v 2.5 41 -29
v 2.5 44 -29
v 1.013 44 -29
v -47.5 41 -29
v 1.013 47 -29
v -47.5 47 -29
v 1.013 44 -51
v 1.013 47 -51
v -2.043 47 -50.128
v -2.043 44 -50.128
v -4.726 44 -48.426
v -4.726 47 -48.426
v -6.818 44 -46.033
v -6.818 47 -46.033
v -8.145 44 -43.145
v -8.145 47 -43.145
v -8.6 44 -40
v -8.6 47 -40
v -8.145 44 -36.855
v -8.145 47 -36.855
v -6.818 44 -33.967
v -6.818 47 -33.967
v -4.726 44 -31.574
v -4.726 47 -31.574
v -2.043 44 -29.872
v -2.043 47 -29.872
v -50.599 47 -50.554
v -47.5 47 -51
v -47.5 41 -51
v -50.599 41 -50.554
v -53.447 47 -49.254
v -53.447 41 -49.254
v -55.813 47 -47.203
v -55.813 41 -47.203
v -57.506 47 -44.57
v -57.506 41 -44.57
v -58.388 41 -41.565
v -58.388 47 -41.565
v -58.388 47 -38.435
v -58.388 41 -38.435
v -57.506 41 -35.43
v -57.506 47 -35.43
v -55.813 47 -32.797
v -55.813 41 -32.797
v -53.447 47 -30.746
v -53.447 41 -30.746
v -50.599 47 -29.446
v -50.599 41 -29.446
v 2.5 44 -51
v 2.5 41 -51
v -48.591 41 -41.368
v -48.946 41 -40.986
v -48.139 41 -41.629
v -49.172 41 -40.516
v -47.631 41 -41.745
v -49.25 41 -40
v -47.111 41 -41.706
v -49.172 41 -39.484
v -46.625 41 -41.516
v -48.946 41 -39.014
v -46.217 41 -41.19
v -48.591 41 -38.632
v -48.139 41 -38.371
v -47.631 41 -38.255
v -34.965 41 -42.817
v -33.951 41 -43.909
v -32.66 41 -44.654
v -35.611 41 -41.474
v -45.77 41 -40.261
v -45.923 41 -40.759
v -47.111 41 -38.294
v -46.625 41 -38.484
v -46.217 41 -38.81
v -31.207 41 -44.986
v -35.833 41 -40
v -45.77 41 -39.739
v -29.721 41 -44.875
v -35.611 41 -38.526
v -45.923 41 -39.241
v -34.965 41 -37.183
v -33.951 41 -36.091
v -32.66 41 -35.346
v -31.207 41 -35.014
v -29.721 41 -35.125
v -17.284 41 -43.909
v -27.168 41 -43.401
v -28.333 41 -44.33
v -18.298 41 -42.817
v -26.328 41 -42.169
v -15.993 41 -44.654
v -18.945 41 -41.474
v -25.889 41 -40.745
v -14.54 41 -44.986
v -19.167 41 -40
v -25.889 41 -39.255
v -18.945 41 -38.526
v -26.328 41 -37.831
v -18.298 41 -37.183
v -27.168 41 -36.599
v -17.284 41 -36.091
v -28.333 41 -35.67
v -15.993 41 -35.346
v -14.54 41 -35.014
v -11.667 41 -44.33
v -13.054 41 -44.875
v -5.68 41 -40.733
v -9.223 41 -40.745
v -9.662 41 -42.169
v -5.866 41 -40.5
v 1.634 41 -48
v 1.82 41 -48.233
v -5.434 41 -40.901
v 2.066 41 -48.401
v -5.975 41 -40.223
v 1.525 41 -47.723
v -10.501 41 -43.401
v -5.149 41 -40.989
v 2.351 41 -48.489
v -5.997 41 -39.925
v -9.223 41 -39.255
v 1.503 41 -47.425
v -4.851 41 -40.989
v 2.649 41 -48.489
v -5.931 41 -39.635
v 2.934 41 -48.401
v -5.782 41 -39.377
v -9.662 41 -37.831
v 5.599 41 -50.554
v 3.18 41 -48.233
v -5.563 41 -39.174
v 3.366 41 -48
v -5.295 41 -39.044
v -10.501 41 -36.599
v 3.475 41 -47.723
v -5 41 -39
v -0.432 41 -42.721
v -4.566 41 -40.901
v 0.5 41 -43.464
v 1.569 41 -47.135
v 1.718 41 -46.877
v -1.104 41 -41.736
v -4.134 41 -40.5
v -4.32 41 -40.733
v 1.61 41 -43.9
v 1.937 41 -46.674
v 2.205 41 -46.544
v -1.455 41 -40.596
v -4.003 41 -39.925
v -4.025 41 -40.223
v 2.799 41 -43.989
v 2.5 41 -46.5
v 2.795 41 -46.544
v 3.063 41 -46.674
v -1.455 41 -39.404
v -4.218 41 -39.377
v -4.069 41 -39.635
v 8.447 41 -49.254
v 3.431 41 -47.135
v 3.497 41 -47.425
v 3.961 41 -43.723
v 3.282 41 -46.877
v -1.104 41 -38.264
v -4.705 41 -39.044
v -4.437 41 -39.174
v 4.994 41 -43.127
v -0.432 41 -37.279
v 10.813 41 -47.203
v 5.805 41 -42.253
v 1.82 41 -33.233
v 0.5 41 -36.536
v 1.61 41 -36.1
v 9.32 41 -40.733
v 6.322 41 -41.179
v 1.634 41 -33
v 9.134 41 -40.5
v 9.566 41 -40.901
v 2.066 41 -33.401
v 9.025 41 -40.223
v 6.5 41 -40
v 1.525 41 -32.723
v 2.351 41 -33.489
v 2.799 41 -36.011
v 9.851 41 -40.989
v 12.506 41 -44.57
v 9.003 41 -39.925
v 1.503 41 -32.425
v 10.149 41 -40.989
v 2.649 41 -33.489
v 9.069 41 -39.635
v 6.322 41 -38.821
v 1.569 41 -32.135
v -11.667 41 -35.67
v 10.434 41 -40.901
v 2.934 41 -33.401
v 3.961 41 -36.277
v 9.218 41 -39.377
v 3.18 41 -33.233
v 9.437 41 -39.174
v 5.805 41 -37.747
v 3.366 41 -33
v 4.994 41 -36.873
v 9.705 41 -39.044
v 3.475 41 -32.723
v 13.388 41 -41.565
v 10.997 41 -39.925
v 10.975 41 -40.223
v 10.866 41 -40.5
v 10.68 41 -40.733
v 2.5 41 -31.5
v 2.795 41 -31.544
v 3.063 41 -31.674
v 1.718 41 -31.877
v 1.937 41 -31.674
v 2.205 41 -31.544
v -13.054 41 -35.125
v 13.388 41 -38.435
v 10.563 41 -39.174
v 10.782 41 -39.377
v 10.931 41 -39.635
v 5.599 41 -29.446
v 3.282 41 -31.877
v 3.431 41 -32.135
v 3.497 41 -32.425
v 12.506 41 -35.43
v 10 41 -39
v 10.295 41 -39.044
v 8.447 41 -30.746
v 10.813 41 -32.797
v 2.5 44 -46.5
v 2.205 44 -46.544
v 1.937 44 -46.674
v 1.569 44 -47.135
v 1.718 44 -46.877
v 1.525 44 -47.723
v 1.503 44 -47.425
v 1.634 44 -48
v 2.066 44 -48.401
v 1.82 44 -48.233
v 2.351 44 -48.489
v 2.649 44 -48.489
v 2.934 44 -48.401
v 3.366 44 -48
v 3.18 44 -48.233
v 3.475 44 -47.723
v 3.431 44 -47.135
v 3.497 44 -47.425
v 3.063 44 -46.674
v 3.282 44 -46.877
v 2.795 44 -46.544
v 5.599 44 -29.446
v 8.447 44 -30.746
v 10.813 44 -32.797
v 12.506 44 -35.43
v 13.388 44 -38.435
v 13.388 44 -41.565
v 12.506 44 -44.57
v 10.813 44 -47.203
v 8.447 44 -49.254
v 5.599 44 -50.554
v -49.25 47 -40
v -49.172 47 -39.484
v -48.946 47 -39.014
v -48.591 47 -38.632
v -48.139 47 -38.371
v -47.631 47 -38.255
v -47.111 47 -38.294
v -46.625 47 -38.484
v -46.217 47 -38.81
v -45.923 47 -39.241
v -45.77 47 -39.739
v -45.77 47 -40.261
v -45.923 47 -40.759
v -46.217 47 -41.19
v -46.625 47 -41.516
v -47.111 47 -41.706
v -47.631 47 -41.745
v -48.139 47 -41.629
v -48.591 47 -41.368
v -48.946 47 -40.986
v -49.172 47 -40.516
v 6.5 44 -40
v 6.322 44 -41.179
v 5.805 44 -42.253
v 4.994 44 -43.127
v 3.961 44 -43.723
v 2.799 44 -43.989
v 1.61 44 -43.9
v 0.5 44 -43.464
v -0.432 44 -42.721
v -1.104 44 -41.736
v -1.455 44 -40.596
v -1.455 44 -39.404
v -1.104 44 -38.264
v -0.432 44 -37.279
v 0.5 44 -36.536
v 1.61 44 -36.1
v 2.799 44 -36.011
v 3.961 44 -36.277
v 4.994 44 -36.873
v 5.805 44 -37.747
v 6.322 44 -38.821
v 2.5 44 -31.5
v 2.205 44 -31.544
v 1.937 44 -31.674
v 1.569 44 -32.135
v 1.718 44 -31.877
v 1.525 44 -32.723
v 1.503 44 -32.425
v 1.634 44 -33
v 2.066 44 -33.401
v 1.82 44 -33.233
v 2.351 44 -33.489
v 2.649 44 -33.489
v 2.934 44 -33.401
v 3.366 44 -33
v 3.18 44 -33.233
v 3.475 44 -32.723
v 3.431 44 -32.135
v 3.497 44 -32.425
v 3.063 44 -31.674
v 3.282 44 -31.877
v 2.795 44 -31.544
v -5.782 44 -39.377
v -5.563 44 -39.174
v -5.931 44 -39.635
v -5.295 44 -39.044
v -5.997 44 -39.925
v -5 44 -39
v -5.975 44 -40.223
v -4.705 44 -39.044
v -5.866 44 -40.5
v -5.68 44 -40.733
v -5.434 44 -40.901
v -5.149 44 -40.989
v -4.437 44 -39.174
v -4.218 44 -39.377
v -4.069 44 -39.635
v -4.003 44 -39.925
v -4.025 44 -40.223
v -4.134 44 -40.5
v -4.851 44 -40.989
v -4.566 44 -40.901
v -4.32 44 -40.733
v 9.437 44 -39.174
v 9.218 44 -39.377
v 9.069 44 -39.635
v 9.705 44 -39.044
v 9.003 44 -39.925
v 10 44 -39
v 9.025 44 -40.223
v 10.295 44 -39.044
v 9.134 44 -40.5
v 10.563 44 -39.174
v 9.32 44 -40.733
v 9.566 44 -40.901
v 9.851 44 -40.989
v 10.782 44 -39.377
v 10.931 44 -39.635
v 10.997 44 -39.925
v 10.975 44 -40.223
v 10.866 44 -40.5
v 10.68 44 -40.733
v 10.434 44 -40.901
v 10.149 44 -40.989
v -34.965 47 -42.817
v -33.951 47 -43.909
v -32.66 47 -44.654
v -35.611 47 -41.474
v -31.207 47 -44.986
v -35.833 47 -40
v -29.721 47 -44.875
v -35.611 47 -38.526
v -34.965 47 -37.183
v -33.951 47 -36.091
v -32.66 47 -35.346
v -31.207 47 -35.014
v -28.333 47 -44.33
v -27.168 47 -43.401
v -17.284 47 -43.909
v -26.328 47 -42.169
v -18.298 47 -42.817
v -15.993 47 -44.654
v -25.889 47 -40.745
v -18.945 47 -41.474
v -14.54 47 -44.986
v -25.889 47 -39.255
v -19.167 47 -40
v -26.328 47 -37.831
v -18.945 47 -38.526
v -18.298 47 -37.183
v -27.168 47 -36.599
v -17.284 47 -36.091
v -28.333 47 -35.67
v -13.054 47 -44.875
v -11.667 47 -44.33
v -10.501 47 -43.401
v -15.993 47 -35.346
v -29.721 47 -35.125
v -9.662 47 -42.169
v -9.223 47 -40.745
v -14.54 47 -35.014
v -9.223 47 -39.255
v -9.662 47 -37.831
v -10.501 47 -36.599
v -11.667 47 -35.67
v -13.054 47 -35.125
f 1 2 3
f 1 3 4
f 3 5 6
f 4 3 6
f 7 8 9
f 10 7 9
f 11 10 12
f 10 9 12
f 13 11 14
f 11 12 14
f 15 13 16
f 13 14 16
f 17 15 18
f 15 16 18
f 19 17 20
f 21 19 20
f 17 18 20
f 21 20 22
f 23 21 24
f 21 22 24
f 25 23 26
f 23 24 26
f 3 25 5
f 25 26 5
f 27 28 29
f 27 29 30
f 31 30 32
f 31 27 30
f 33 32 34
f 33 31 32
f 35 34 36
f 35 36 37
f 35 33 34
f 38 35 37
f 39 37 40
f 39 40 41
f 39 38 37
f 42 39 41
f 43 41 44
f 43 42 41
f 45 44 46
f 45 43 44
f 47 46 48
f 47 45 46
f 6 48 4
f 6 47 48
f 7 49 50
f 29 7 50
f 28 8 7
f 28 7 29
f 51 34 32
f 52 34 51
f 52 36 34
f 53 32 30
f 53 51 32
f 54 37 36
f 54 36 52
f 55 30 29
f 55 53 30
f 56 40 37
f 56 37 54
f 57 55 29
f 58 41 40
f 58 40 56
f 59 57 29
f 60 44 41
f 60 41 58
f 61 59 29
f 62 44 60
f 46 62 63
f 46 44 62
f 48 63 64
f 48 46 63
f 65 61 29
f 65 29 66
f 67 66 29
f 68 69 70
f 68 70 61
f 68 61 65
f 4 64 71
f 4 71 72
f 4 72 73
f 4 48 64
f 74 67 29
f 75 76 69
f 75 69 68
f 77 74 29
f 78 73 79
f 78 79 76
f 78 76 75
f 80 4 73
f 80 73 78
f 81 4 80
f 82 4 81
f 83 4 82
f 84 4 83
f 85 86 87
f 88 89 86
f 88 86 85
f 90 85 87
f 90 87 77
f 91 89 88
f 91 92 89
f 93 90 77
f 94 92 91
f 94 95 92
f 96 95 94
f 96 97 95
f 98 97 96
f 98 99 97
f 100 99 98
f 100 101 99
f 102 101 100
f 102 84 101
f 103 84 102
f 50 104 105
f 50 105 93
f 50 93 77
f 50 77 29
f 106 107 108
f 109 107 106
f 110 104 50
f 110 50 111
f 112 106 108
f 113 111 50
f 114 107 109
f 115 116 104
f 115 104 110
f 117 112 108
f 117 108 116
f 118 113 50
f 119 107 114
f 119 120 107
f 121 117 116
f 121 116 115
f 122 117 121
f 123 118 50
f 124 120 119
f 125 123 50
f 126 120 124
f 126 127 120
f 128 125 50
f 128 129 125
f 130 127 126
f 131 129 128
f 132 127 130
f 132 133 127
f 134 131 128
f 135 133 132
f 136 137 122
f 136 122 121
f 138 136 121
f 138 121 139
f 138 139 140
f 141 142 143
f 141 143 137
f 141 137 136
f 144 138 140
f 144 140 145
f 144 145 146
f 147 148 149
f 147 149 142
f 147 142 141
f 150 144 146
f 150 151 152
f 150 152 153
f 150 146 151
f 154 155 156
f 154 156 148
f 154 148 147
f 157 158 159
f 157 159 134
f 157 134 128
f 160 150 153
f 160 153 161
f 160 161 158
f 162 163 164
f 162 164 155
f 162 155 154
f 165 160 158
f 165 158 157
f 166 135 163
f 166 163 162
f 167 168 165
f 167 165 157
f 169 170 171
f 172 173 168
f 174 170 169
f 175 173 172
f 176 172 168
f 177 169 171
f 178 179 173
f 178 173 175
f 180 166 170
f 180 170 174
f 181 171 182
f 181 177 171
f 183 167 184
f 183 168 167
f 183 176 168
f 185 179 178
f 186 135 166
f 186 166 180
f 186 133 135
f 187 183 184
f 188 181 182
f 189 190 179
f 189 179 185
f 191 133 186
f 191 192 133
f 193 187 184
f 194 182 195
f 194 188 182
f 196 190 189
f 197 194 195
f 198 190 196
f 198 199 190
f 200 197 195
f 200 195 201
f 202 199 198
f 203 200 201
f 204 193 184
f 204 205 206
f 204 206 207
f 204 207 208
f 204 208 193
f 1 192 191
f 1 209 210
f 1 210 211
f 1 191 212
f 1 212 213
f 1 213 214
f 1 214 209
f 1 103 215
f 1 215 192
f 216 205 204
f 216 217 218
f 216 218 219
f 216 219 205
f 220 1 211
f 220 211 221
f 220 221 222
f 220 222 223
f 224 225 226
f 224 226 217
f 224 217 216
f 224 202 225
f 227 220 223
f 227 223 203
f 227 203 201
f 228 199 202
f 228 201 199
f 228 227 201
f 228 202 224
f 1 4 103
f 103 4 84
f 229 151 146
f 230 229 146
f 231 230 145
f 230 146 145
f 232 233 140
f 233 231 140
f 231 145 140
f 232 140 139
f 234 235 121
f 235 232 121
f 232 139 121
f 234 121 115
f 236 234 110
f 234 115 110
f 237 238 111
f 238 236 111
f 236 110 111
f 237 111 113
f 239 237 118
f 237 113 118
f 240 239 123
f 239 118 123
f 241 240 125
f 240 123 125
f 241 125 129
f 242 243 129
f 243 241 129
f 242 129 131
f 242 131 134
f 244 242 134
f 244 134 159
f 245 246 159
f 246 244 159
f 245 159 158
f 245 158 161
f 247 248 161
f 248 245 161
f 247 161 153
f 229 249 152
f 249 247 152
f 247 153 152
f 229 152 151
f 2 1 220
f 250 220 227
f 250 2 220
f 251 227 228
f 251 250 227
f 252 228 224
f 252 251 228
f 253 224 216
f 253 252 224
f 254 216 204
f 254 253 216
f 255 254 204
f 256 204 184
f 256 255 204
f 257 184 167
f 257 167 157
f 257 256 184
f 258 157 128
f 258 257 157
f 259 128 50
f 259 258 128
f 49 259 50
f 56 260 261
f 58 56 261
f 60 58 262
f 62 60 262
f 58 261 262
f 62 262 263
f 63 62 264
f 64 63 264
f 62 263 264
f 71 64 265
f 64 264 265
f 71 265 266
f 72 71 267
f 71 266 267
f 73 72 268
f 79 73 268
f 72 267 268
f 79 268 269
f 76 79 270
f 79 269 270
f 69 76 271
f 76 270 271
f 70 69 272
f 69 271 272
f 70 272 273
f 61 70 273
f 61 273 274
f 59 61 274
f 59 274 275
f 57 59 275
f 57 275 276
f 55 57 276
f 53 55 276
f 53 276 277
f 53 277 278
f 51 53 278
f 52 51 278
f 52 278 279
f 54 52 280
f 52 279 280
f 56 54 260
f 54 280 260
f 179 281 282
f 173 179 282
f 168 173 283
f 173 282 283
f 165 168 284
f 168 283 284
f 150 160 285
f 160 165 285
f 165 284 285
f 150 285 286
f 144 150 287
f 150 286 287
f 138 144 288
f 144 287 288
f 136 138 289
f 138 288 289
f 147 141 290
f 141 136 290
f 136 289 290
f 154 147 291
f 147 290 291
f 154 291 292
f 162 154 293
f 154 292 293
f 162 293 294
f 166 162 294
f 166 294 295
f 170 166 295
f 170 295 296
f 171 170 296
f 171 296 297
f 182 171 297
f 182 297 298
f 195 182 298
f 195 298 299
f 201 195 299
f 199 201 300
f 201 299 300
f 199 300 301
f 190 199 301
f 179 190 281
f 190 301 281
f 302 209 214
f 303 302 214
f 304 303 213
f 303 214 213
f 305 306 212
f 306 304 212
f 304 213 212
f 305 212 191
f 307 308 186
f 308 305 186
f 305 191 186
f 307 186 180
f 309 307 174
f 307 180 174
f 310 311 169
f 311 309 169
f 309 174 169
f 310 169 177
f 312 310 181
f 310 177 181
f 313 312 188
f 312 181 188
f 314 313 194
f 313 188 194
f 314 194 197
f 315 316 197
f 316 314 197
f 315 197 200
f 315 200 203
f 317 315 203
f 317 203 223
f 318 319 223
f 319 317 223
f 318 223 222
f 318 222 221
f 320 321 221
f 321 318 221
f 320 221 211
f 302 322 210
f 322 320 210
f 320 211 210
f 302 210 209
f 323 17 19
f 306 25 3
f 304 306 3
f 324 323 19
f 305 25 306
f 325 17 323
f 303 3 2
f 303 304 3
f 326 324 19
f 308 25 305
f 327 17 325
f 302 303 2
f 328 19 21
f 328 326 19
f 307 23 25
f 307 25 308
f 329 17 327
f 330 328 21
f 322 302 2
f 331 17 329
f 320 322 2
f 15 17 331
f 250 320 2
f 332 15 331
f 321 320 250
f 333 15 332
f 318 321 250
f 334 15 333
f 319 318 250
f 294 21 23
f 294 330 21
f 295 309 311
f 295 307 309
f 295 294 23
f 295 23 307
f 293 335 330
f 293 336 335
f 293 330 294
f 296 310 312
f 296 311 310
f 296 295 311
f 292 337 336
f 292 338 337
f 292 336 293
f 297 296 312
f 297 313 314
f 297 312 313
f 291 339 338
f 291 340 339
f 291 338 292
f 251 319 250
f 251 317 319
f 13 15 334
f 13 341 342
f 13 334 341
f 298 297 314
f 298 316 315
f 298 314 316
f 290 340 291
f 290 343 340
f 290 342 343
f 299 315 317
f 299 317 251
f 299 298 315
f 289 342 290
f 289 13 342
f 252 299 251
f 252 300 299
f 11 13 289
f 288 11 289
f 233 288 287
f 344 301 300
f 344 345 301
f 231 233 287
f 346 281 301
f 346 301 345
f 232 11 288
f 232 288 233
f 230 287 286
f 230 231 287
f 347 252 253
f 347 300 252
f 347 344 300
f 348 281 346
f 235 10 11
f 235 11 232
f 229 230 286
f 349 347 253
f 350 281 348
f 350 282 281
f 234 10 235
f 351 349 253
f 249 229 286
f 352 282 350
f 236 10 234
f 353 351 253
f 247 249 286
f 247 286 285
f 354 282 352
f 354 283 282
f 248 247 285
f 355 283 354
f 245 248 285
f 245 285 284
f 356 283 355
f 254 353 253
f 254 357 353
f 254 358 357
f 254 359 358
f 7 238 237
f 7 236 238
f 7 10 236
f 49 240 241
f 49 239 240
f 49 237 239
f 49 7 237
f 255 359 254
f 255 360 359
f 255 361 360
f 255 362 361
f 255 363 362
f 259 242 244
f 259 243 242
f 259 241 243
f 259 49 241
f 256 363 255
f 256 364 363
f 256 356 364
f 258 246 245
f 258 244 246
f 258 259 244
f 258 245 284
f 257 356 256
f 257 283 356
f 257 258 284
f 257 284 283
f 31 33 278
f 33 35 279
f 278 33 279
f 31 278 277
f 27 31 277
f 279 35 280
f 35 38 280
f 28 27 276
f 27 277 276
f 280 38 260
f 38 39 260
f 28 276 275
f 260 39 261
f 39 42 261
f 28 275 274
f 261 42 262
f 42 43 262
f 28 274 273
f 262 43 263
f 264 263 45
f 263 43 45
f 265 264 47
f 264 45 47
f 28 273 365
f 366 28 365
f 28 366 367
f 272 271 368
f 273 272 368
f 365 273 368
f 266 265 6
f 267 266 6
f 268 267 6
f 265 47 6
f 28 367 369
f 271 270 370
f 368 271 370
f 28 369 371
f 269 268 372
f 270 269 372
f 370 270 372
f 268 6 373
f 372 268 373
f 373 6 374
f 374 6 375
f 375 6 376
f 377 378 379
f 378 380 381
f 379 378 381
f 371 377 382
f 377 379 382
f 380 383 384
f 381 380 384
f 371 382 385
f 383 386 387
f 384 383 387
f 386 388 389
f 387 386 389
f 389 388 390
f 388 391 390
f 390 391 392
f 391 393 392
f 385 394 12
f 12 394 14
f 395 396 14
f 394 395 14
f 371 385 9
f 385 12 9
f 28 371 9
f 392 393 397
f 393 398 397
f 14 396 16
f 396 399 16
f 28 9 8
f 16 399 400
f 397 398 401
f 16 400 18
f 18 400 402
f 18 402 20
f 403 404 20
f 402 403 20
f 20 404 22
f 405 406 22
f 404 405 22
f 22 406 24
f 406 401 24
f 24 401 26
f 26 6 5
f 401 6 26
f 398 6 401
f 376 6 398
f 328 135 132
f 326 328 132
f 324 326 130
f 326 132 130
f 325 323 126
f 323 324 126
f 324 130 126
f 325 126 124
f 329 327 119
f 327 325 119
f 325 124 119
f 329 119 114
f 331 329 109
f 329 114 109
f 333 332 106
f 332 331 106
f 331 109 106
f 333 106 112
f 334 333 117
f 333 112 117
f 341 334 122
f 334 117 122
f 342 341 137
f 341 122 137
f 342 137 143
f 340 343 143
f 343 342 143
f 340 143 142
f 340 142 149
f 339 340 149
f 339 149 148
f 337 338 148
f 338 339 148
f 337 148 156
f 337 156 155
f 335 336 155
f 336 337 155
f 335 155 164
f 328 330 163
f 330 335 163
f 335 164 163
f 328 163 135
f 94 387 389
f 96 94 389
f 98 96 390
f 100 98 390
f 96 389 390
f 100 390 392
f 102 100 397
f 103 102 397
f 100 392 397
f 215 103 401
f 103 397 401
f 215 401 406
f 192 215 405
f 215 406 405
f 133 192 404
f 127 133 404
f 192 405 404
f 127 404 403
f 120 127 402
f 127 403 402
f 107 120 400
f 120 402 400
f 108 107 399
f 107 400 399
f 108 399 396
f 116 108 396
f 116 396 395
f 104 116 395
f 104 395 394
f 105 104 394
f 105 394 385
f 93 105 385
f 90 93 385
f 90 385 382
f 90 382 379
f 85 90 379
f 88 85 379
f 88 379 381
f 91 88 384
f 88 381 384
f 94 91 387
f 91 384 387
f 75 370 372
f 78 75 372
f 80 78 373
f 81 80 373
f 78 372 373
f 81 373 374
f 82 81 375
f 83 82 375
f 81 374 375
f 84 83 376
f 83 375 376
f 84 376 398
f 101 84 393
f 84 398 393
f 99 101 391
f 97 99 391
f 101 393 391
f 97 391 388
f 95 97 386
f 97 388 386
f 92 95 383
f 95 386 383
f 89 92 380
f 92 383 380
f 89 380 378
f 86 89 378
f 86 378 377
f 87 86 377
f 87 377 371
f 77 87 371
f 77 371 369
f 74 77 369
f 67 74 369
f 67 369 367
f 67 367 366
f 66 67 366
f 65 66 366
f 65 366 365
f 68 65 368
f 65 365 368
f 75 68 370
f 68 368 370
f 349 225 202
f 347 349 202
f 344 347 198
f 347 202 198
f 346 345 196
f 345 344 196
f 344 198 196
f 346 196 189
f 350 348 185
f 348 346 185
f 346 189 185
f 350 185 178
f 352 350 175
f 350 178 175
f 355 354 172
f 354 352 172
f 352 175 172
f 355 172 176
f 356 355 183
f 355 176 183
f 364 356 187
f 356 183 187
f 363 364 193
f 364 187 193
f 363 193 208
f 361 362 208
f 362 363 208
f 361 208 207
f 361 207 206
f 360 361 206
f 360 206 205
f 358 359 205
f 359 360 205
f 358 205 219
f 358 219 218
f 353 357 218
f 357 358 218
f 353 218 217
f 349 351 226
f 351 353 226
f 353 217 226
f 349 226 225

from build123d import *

# Parameters (mm, degrees)
CYLINDER020_R             = 11.1
CYLINDER020_DEPTH         = 26
CYLINDER019_R             = 4
CYLINDER019_DEPTH         = 43
CYLINDER021_R             = 1
CYLINDER021_DEPTH         = 31
CYLINDER024_R             = 1
CYLINDER024_DEPTH         = 31
CYLINDER023_R             = 1
CYLINDER023_DEPTH         = 31
CYLINDER022_R             = 1
CYLINDER022_DEPTH         = 31
FUSION002_ROLL_ANGLE      = -90
FUSION003_PLACEMENT_ANGLE = 180
SKETCH_R                  = 5
SKETCH_R_2                = 1.75
PAD_DEPTH                 = 6
CUT_PITCH_ANGLE           = 90


with BuildPart() as cylinder141:
    # Cylinder020 → Cylinder020 (new body)
    with BuildSketch(Plane(origin=(-3, 71, 73), x_dir=(0, 0, 1), z_dir=(0, -1, 0))):
        Circle(CYLINDER020_R)
    extrude(amount=CYLINDER020_DEPTH)


with BuildPart() as fusion001:
    # Cylinder019 → Cylinder019 (new body)
    with BuildSketch(Plane(origin=(-3, 66, 73), x_dir=(0, 0, 1), z_dir=(0, -1, 0))):
        Circle(CYLINDER019_R)
    extrude(amount=CYLINDER019_DEPTH)

    # Fusion001: union Cylinder141
    add(cylinder141.part)


with BuildPart() as cylinder096:
    # Cylinder021 → Cylinder021 (new body)
    with BuildSketch(Plane(origin=(-7.5, -11, 132), x_dir=(1, 0, 0), z_dir=(0, 0, 1))):
        Circle(CYLINDER021_R)
    extrude(amount=CYLINDER021_DEPTH)


with BuildPart() as cylinder146:
    # Cylinder024 → Cylinder024 (new body)
    with BuildSketch(Plane(origin=(0, -3.5, 132), x_dir=(1, 0, 0), z_dir=(0, 0, 1))):
        Circle(CYLINDER024_R)
    extrude(amount=CYLINDER024_DEPTH)


with BuildPart() as cylinder145:
    # Cylinder023 → Cylinder023 (new body)
    with BuildSketch(Plane(origin=(7.5, -11, 132), x_dir=(1, 0, 0), z_dir=(0, 0, 1))):
        Circle(CYLINDER023_R)
    extrude(amount=CYLINDER023_DEPTH)


with BuildPart() as fusion003:
    # Cylinder022 → Cylinder022 (new body)
    with BuildSketch(Plane(origin=(0, -18.5, 132), x_dir=(1, 0, 0), z_dir=(0, 0, 1))):
        Circle(CYLINDER022_R)
    extrude(amount=CYLINDER022_DEPTH)

    # Fusion002: union Cylinder096, Cylinder146, Cylinder145
    add(cylinder096.part)
    add(cylinder146.part)
    add(cylinder145.part)


with BuildPart() as fusion003_1:
    # Fusion002 roll: moved
    add(fusion003.part.rotate(Axis((0, 0, 0), (1, 0, 0)), FUSION002_ROLL_ANGLE))


with BuildPart() as fusion003_2:
    # Fusion002 placement: moved
    add(fusion003_1.part.moved(Location((-3, -97.5, 62))))

    # Fusion003: union Fusion001
    add(fusion001.part)


with BuildPart() as fusion003_3:
    # Fusion003 placement: moved
    add(fusion003_2.part.moved(Location((-0.5, 88, -87))).rotate(Axis((-0.5, 88, -87), (0, 0, 1)), FUSION003_PLACEMENT_ANGLE))


with BuildPart() as clone_of_cut:
    # Sketch → Pad (new body)
    with BuildSketch(Plane(origin=(-11.5, 40, -16.5), x_dir=(0, 0, -1), z_dir=(0, 1, 0))):
        with BuildLine():
            Line((-2.5, -3), (47.5, -3))
            ThreePointArc((47.5, -25), (58.5, -14), (47.5, -3))
            Line((-2.5, -25), (47.5, -25))
            ThreePointArc((-2.5, -3), (-13.5, -14), (-2.5, -25))
        make_face()
        with Locations((14.166667, -14)):
            Circle(SKETCH_R, mode=Mode.SUBTRACT)
        with Locations((30.833333, -14)):
            Circle(SKETCH_R, mode=Mode.SUBTRACT)
        with Locations((47.5, -14)):
            Circle(SKETCH_R_2, mode=Mode.SUBTRACT)
    extrude(amount=PAD_DEPTH)

    # Cut: cut Fusion003
    add(fusion003_3.part, mode=Mode.SUBTRACT)


with BuildPart() as clone_of_cut_1:
    # Cut pitch: moved
    add(clone_of_cut.part.rotate(Axis((0, 0, 0), (0, 1, 0)), CUT_PITCH_ANGLE))


with BuildPart() as clone_of_cut_2:
    # Cut placement: moved
    add(clone_of_cut_1.part.moved(Location((16.5, -87, -15))))


with BuildPart() as clone_of_cut_3:
    # Clone010 placement: moved
    add(clone_of_cut_2.part.moved(Location((0, 0, -22.5))))


with BuildPart() as part_mirroring026:
    # Part__Mirroring026: instance of Clone of Cut
    add(clone_of_cut_3.part.mirror(Plane(origin=(0, 0, 0), x_dir=(1, 0, 0), z_dir=(0, 1, 0))))


solid = part_mirroring026.part
